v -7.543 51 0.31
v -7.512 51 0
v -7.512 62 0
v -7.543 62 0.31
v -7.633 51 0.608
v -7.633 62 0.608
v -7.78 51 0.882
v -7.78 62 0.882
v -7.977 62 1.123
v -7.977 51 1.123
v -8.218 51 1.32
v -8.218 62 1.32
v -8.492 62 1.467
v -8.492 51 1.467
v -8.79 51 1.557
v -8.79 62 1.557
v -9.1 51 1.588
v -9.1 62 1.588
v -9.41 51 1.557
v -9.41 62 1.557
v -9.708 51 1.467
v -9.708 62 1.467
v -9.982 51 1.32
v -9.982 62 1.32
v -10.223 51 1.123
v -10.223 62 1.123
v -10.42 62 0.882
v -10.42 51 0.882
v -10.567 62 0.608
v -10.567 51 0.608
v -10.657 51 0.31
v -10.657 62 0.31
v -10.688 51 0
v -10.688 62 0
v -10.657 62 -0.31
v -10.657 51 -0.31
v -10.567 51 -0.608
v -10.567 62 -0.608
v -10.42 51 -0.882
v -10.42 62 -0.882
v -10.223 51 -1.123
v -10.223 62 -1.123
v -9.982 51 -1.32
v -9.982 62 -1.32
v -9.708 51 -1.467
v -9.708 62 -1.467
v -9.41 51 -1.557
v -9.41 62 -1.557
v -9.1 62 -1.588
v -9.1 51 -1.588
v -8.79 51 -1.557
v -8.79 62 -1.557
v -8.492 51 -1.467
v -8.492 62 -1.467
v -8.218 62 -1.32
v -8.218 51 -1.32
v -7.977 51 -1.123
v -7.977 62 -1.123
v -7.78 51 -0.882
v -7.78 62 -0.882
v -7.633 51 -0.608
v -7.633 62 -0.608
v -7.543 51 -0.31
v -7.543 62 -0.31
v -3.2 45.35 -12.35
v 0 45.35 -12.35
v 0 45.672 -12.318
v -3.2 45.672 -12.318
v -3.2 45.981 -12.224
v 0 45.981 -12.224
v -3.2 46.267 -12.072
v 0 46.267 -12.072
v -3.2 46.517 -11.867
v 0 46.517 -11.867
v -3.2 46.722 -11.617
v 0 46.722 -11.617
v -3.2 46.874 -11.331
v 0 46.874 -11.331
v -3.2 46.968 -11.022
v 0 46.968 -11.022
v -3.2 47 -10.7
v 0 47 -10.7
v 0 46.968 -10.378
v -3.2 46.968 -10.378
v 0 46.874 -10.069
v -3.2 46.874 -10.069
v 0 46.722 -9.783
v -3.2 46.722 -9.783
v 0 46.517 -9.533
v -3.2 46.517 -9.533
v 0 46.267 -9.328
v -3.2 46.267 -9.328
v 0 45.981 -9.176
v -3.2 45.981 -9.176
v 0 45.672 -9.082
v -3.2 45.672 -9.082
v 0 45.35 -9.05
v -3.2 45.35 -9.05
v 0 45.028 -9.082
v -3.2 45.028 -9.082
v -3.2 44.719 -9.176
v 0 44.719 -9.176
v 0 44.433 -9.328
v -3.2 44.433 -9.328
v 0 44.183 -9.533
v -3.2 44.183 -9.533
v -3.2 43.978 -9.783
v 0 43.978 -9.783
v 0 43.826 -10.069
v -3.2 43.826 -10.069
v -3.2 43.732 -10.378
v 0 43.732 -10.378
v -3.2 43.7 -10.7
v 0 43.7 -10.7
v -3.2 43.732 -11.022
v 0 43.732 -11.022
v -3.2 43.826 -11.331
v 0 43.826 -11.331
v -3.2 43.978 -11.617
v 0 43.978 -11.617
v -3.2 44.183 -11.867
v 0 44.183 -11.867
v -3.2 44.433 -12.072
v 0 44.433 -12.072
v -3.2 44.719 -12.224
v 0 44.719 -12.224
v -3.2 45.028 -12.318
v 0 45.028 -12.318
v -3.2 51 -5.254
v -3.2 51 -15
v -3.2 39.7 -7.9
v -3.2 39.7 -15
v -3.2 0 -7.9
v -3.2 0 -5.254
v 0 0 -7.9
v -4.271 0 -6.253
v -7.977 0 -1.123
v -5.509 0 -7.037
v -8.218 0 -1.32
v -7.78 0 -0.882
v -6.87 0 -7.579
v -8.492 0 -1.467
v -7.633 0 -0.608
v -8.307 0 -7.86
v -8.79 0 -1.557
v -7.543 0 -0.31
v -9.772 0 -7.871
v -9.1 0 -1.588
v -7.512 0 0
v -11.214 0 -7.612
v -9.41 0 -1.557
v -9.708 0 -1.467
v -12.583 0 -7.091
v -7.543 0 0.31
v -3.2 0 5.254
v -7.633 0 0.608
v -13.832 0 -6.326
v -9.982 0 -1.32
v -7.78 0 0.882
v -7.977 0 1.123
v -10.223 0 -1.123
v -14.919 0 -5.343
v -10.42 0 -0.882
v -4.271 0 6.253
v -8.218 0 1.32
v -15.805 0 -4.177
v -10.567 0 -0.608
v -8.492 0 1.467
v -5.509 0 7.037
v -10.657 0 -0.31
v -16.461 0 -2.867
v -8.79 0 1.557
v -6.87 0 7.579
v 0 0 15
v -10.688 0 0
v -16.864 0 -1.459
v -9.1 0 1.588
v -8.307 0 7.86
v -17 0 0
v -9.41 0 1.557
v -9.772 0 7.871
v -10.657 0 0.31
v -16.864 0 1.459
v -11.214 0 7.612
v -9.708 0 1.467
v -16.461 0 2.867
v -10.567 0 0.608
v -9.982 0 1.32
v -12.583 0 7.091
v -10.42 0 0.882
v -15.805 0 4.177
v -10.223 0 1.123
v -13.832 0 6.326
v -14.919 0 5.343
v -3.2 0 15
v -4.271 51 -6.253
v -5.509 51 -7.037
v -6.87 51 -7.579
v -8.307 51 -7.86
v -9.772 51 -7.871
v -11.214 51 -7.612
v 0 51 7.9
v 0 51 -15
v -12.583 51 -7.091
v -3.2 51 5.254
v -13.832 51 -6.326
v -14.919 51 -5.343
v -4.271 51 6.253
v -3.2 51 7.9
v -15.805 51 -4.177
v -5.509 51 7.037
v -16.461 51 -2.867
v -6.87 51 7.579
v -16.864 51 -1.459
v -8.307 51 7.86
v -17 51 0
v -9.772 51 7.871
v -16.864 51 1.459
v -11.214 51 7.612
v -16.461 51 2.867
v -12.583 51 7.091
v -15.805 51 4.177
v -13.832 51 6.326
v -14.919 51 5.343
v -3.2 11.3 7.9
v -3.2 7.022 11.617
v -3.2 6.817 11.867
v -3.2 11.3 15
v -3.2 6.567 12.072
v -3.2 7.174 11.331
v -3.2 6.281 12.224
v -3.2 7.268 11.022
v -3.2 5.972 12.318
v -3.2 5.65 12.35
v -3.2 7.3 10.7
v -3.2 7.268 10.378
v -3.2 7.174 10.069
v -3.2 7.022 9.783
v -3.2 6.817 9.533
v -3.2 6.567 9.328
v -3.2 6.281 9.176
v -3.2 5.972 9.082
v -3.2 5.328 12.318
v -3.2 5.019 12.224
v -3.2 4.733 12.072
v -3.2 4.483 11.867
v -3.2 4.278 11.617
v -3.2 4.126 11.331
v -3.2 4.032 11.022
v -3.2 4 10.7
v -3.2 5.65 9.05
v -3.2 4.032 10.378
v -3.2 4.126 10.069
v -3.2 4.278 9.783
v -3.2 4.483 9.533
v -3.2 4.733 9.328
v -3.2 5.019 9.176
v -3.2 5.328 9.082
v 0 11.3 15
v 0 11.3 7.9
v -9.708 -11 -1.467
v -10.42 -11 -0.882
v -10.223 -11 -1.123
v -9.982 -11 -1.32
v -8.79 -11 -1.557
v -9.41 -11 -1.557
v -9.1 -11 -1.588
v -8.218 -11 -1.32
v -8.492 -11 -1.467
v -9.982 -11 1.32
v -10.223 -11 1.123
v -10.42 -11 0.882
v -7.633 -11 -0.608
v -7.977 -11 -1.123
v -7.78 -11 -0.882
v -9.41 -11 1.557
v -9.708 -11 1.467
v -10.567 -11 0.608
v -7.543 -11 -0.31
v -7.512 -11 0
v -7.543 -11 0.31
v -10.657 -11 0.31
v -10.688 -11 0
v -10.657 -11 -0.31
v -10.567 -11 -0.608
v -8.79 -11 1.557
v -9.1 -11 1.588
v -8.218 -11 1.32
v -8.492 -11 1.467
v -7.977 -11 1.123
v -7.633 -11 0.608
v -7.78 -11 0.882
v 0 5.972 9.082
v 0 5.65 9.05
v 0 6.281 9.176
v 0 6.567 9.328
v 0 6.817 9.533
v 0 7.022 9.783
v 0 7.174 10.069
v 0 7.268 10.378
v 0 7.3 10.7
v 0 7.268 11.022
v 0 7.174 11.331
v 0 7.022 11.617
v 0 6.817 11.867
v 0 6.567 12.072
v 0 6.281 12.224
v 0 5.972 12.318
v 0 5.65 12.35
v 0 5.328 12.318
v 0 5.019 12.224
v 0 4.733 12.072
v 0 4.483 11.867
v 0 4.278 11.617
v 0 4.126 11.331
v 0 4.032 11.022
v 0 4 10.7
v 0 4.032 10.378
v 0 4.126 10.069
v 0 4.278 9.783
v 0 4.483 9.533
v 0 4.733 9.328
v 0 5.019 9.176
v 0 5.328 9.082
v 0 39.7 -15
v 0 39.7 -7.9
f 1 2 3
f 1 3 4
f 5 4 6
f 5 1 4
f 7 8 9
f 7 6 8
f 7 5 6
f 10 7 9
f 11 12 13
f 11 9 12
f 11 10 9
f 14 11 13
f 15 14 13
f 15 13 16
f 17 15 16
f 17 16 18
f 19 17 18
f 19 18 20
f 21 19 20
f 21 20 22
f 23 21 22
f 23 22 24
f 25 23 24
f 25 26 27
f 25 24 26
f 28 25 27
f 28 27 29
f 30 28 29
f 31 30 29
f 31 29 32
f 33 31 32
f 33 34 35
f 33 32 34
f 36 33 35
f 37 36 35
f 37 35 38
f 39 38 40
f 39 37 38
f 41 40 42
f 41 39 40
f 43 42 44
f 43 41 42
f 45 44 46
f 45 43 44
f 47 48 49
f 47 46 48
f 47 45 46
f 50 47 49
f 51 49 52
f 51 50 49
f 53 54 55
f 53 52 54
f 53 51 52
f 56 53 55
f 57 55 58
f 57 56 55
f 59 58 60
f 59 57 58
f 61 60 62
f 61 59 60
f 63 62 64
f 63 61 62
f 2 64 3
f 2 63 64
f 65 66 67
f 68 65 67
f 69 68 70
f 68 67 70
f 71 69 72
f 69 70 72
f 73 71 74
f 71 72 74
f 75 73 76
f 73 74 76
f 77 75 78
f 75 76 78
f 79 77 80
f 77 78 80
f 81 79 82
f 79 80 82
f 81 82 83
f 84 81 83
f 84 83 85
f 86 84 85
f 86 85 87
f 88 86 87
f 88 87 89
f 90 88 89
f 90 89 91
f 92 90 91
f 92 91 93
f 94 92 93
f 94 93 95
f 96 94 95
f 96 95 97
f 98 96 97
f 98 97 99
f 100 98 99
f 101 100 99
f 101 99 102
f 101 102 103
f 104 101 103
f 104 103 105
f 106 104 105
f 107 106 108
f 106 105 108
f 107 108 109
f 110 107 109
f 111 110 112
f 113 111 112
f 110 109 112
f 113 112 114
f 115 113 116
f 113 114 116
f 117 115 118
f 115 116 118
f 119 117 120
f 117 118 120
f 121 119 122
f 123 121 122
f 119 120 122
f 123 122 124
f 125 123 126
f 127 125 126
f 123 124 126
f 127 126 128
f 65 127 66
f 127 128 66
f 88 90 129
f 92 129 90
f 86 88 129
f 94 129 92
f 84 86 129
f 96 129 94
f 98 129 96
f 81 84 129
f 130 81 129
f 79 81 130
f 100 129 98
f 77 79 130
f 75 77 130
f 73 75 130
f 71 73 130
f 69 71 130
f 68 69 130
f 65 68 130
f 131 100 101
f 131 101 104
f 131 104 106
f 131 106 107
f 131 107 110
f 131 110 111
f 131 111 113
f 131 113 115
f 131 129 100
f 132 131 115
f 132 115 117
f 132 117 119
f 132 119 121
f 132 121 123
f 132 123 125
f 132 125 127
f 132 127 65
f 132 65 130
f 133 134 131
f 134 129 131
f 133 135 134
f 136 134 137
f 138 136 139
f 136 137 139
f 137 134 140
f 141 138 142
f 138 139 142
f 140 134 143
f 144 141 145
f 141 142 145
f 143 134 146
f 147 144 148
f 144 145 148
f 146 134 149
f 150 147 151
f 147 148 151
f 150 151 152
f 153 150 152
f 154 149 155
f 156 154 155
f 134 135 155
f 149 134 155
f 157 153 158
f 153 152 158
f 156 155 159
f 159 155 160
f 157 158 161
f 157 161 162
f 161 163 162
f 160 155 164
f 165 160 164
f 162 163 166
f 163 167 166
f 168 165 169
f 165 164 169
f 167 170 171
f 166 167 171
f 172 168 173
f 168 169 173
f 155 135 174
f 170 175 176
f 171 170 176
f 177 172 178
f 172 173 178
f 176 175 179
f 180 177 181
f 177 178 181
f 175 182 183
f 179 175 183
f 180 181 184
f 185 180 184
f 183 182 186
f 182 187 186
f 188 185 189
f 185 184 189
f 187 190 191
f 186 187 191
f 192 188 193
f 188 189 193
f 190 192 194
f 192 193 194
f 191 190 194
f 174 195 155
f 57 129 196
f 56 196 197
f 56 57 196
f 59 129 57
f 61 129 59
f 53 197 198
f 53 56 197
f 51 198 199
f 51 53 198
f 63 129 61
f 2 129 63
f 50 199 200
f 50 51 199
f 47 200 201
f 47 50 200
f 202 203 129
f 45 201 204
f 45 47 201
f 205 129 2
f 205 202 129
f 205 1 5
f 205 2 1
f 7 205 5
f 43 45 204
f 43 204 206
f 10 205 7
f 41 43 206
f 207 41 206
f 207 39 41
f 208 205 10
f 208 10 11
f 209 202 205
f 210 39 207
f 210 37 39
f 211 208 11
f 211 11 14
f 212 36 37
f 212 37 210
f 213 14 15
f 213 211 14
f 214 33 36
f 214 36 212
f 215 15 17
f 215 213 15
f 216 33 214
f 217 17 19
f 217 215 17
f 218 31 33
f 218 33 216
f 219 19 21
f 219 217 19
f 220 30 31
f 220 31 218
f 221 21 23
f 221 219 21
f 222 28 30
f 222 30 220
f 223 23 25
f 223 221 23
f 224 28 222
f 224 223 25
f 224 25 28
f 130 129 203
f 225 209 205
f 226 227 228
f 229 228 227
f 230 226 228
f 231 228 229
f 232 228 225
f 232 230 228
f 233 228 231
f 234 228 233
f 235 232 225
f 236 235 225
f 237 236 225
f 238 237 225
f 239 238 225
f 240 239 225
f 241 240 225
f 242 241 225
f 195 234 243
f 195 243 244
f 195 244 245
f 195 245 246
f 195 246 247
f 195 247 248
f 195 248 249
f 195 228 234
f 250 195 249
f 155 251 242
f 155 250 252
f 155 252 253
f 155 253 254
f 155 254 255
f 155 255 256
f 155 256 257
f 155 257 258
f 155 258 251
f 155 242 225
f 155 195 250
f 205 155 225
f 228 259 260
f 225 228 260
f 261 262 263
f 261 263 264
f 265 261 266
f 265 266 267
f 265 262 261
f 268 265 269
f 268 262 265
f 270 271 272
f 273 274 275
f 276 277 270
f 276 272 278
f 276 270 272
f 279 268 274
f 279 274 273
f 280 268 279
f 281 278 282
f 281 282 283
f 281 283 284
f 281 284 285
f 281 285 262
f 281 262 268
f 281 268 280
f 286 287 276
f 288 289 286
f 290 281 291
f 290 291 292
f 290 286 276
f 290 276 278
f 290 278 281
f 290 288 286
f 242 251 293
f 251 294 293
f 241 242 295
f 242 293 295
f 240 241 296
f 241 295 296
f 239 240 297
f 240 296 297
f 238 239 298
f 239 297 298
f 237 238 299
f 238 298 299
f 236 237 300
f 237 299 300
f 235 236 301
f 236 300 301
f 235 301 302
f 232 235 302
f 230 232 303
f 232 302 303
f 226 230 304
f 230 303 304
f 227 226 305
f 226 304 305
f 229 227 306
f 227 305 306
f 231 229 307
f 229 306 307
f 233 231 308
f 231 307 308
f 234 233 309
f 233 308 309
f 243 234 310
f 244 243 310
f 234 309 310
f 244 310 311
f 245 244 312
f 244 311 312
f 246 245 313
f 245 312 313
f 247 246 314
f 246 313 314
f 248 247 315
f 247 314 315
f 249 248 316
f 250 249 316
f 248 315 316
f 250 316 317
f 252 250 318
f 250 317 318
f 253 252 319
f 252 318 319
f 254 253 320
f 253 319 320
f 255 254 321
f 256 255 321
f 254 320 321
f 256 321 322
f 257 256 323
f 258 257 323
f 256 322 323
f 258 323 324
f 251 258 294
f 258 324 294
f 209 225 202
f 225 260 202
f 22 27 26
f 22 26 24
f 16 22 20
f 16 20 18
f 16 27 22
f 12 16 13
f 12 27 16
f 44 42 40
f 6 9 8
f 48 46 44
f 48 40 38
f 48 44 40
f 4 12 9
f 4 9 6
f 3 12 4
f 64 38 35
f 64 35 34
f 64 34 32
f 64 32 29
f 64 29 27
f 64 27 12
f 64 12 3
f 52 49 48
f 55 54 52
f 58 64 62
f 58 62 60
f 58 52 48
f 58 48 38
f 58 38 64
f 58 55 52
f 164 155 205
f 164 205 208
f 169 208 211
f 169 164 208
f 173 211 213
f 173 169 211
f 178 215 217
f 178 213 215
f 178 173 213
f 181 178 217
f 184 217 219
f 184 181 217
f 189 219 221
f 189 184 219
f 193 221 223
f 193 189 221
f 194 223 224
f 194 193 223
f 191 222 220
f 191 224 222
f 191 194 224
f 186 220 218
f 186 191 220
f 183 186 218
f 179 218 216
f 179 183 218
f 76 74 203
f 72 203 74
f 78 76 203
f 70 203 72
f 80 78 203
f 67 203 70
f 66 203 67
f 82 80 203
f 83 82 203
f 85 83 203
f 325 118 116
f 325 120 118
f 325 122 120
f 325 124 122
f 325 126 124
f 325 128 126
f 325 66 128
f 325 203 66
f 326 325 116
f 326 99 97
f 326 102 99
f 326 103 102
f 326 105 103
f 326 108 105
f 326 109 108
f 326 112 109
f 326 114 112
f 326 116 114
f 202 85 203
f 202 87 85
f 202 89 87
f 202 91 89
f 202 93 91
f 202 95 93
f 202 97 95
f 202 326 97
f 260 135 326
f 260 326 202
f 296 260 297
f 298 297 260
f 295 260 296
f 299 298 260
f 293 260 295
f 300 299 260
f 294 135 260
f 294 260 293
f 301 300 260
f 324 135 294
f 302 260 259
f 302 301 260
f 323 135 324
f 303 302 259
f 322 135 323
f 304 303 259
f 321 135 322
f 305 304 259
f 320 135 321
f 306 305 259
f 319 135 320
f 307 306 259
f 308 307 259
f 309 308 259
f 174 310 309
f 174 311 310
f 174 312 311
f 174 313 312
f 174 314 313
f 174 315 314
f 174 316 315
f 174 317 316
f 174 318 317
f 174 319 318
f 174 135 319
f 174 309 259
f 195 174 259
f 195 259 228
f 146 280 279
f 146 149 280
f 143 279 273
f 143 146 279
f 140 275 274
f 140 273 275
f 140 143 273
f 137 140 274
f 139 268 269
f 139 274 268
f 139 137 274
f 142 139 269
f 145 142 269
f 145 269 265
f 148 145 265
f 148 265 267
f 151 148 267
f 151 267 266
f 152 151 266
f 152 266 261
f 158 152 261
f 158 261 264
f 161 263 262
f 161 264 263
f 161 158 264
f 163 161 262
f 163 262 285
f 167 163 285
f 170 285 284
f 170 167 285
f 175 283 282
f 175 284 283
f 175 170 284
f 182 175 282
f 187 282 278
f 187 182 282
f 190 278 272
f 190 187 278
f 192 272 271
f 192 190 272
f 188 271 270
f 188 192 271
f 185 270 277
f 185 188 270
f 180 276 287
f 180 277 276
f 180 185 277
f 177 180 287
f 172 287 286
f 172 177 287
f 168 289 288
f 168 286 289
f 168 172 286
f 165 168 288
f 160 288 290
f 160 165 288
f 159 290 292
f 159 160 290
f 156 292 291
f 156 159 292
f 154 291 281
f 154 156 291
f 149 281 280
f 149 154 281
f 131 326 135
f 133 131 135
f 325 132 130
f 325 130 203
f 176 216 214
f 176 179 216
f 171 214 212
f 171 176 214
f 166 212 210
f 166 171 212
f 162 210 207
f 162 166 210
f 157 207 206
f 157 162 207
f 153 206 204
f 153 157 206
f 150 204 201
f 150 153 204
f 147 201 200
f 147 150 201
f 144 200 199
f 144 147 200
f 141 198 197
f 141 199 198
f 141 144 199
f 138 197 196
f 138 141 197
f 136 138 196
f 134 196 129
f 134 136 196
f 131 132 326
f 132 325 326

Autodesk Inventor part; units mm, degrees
ref_plane "YZ Plane" through (0, 0, 0) normal (1, 0, 0) x (0, 1, 0)
ref_plane "XZ Plane" through (0, 0, 0) normal (0, 1, 0) x (-1, 0, 0)
ref_plane "XY Plane" through (0, 0, 0) normal (0, 0, 1) x (1, 0, 0)
sketch "Sketch1" plane through (0, 0, 0) normal (0, 1, 0) x (-1, 0, 0)
  arc A0 (3.2, -5.2536) -> (17, 0) centre (9.1, 0) ccw
  line L0 (3.2, -5.2536) -> (3.2, -15)
  line L1 (3.2, -15) -> (0, -15)
  line L2 (0, -15) -> (0, 15)
  line L3 (0, 15) -> (3.2, 15)
  line L4 (3.2, 15) -> (3.2, 5.2536)
  arc A1 (17, 0) -> (3.2, 5.2536) centre (9.1, 0) ccw
  line L5 (9.1, 7.9) -> (9.1, -7.9) construction
  line L6 (3.2, 5.2536) -> (17, 0) construction
  line L7 (3.2, -5.2536) -> (17, 0) construction
  point P0 (0, 0)
  point P1 (0, 0)
  dimension "d0" = 3.2
  dimension "d1" = 30
  dimension "d5" = 15.8
  dimension "d6" = 17
extrude "Extrusion1" add sketch "Sketch1" along normal blind 51
sketch "Sketch2" plane through (0, 0, 15) normal (1, 0, 0) x (0, 0, -1)
  circle A0 centre (25.7, 45.35) radius 1.65
  circle A1 centre (4.3, 5.65) radius 1.65
  line L0 (25.7, 45.35) -> (25.7, 5.65) construction
  line L1 (25.7, 5.65) -> (4.3, 5.65) construction
  line L2 (30, 0) -> (30, 51) projected
  line L3 (0, 0) -> (0, 51) projected
  line L4 (25.7, 45.35) -> (30, 45.35) construction
  line L5 (25.7, 45.35) -> (30, 51) construction
  line L6 (0, 0) -> (4.3, 5.65) construction
  line L7 (4.3, 5.65) -> (0, 5.65) construction
  line L8 (30, 39.7) -> (22.9, 39.7)
  line L9 (22.9, 39.7) -> (22.9, 0)
  line L10 (22.9, 0) -> (30, 0)
  line L11 (0, 11.3) -> (7.1, 11.3)
  line L12 (7.1, 11.3) -> (7.1, 51)
  line L13 (7.1, 51) -> (0, 51)
  line L14 (25.7, 45.35) -> (30, 39.7) construction
  point P0 (15, 0)
  dimension "d9" = 21.4
  dimension "d10" = 39.7
  dimension "d11" = 3.3
  dimension "d12" = 2.8
extrude "Extrusion2" cut sketch "Sketch2" against normal up to surface (3.2 mm away)
sketch "Sketch3" plane through (0, 0, 0) normal (0, -1, 0) x (1, 0, 0)
  arc A0 (-3.2, 5.2536) -> (-3.2, -5.2536) centre (-9.1, 0) ccw projected
  circle A1 centre (-9.1, 0) radius 1.5875
  point P0 (0, 0)
  dimension "d15" = 3.175
extrude "Extrusion3" add sketch "Sketch3" along normal blind 11
sketch "Sketch4" plane through (0, 51, 0) normal (0, 1, 0) x (1, 0, 0)
  arc A0 (-3.2, 5.2536) -> (-3.2, -5.2536) centre (-9.1, 0) ccw construction
  circle A1 centre (-9.1, 0) radius 1.5875
  point P0 (0, 0)
  dimension "d18" = 3.175
extrude "Extrusion4" add sketch "Sketch4" along normal blind 11
properties part number "Power Resistor - HSA50" material "Gold"
